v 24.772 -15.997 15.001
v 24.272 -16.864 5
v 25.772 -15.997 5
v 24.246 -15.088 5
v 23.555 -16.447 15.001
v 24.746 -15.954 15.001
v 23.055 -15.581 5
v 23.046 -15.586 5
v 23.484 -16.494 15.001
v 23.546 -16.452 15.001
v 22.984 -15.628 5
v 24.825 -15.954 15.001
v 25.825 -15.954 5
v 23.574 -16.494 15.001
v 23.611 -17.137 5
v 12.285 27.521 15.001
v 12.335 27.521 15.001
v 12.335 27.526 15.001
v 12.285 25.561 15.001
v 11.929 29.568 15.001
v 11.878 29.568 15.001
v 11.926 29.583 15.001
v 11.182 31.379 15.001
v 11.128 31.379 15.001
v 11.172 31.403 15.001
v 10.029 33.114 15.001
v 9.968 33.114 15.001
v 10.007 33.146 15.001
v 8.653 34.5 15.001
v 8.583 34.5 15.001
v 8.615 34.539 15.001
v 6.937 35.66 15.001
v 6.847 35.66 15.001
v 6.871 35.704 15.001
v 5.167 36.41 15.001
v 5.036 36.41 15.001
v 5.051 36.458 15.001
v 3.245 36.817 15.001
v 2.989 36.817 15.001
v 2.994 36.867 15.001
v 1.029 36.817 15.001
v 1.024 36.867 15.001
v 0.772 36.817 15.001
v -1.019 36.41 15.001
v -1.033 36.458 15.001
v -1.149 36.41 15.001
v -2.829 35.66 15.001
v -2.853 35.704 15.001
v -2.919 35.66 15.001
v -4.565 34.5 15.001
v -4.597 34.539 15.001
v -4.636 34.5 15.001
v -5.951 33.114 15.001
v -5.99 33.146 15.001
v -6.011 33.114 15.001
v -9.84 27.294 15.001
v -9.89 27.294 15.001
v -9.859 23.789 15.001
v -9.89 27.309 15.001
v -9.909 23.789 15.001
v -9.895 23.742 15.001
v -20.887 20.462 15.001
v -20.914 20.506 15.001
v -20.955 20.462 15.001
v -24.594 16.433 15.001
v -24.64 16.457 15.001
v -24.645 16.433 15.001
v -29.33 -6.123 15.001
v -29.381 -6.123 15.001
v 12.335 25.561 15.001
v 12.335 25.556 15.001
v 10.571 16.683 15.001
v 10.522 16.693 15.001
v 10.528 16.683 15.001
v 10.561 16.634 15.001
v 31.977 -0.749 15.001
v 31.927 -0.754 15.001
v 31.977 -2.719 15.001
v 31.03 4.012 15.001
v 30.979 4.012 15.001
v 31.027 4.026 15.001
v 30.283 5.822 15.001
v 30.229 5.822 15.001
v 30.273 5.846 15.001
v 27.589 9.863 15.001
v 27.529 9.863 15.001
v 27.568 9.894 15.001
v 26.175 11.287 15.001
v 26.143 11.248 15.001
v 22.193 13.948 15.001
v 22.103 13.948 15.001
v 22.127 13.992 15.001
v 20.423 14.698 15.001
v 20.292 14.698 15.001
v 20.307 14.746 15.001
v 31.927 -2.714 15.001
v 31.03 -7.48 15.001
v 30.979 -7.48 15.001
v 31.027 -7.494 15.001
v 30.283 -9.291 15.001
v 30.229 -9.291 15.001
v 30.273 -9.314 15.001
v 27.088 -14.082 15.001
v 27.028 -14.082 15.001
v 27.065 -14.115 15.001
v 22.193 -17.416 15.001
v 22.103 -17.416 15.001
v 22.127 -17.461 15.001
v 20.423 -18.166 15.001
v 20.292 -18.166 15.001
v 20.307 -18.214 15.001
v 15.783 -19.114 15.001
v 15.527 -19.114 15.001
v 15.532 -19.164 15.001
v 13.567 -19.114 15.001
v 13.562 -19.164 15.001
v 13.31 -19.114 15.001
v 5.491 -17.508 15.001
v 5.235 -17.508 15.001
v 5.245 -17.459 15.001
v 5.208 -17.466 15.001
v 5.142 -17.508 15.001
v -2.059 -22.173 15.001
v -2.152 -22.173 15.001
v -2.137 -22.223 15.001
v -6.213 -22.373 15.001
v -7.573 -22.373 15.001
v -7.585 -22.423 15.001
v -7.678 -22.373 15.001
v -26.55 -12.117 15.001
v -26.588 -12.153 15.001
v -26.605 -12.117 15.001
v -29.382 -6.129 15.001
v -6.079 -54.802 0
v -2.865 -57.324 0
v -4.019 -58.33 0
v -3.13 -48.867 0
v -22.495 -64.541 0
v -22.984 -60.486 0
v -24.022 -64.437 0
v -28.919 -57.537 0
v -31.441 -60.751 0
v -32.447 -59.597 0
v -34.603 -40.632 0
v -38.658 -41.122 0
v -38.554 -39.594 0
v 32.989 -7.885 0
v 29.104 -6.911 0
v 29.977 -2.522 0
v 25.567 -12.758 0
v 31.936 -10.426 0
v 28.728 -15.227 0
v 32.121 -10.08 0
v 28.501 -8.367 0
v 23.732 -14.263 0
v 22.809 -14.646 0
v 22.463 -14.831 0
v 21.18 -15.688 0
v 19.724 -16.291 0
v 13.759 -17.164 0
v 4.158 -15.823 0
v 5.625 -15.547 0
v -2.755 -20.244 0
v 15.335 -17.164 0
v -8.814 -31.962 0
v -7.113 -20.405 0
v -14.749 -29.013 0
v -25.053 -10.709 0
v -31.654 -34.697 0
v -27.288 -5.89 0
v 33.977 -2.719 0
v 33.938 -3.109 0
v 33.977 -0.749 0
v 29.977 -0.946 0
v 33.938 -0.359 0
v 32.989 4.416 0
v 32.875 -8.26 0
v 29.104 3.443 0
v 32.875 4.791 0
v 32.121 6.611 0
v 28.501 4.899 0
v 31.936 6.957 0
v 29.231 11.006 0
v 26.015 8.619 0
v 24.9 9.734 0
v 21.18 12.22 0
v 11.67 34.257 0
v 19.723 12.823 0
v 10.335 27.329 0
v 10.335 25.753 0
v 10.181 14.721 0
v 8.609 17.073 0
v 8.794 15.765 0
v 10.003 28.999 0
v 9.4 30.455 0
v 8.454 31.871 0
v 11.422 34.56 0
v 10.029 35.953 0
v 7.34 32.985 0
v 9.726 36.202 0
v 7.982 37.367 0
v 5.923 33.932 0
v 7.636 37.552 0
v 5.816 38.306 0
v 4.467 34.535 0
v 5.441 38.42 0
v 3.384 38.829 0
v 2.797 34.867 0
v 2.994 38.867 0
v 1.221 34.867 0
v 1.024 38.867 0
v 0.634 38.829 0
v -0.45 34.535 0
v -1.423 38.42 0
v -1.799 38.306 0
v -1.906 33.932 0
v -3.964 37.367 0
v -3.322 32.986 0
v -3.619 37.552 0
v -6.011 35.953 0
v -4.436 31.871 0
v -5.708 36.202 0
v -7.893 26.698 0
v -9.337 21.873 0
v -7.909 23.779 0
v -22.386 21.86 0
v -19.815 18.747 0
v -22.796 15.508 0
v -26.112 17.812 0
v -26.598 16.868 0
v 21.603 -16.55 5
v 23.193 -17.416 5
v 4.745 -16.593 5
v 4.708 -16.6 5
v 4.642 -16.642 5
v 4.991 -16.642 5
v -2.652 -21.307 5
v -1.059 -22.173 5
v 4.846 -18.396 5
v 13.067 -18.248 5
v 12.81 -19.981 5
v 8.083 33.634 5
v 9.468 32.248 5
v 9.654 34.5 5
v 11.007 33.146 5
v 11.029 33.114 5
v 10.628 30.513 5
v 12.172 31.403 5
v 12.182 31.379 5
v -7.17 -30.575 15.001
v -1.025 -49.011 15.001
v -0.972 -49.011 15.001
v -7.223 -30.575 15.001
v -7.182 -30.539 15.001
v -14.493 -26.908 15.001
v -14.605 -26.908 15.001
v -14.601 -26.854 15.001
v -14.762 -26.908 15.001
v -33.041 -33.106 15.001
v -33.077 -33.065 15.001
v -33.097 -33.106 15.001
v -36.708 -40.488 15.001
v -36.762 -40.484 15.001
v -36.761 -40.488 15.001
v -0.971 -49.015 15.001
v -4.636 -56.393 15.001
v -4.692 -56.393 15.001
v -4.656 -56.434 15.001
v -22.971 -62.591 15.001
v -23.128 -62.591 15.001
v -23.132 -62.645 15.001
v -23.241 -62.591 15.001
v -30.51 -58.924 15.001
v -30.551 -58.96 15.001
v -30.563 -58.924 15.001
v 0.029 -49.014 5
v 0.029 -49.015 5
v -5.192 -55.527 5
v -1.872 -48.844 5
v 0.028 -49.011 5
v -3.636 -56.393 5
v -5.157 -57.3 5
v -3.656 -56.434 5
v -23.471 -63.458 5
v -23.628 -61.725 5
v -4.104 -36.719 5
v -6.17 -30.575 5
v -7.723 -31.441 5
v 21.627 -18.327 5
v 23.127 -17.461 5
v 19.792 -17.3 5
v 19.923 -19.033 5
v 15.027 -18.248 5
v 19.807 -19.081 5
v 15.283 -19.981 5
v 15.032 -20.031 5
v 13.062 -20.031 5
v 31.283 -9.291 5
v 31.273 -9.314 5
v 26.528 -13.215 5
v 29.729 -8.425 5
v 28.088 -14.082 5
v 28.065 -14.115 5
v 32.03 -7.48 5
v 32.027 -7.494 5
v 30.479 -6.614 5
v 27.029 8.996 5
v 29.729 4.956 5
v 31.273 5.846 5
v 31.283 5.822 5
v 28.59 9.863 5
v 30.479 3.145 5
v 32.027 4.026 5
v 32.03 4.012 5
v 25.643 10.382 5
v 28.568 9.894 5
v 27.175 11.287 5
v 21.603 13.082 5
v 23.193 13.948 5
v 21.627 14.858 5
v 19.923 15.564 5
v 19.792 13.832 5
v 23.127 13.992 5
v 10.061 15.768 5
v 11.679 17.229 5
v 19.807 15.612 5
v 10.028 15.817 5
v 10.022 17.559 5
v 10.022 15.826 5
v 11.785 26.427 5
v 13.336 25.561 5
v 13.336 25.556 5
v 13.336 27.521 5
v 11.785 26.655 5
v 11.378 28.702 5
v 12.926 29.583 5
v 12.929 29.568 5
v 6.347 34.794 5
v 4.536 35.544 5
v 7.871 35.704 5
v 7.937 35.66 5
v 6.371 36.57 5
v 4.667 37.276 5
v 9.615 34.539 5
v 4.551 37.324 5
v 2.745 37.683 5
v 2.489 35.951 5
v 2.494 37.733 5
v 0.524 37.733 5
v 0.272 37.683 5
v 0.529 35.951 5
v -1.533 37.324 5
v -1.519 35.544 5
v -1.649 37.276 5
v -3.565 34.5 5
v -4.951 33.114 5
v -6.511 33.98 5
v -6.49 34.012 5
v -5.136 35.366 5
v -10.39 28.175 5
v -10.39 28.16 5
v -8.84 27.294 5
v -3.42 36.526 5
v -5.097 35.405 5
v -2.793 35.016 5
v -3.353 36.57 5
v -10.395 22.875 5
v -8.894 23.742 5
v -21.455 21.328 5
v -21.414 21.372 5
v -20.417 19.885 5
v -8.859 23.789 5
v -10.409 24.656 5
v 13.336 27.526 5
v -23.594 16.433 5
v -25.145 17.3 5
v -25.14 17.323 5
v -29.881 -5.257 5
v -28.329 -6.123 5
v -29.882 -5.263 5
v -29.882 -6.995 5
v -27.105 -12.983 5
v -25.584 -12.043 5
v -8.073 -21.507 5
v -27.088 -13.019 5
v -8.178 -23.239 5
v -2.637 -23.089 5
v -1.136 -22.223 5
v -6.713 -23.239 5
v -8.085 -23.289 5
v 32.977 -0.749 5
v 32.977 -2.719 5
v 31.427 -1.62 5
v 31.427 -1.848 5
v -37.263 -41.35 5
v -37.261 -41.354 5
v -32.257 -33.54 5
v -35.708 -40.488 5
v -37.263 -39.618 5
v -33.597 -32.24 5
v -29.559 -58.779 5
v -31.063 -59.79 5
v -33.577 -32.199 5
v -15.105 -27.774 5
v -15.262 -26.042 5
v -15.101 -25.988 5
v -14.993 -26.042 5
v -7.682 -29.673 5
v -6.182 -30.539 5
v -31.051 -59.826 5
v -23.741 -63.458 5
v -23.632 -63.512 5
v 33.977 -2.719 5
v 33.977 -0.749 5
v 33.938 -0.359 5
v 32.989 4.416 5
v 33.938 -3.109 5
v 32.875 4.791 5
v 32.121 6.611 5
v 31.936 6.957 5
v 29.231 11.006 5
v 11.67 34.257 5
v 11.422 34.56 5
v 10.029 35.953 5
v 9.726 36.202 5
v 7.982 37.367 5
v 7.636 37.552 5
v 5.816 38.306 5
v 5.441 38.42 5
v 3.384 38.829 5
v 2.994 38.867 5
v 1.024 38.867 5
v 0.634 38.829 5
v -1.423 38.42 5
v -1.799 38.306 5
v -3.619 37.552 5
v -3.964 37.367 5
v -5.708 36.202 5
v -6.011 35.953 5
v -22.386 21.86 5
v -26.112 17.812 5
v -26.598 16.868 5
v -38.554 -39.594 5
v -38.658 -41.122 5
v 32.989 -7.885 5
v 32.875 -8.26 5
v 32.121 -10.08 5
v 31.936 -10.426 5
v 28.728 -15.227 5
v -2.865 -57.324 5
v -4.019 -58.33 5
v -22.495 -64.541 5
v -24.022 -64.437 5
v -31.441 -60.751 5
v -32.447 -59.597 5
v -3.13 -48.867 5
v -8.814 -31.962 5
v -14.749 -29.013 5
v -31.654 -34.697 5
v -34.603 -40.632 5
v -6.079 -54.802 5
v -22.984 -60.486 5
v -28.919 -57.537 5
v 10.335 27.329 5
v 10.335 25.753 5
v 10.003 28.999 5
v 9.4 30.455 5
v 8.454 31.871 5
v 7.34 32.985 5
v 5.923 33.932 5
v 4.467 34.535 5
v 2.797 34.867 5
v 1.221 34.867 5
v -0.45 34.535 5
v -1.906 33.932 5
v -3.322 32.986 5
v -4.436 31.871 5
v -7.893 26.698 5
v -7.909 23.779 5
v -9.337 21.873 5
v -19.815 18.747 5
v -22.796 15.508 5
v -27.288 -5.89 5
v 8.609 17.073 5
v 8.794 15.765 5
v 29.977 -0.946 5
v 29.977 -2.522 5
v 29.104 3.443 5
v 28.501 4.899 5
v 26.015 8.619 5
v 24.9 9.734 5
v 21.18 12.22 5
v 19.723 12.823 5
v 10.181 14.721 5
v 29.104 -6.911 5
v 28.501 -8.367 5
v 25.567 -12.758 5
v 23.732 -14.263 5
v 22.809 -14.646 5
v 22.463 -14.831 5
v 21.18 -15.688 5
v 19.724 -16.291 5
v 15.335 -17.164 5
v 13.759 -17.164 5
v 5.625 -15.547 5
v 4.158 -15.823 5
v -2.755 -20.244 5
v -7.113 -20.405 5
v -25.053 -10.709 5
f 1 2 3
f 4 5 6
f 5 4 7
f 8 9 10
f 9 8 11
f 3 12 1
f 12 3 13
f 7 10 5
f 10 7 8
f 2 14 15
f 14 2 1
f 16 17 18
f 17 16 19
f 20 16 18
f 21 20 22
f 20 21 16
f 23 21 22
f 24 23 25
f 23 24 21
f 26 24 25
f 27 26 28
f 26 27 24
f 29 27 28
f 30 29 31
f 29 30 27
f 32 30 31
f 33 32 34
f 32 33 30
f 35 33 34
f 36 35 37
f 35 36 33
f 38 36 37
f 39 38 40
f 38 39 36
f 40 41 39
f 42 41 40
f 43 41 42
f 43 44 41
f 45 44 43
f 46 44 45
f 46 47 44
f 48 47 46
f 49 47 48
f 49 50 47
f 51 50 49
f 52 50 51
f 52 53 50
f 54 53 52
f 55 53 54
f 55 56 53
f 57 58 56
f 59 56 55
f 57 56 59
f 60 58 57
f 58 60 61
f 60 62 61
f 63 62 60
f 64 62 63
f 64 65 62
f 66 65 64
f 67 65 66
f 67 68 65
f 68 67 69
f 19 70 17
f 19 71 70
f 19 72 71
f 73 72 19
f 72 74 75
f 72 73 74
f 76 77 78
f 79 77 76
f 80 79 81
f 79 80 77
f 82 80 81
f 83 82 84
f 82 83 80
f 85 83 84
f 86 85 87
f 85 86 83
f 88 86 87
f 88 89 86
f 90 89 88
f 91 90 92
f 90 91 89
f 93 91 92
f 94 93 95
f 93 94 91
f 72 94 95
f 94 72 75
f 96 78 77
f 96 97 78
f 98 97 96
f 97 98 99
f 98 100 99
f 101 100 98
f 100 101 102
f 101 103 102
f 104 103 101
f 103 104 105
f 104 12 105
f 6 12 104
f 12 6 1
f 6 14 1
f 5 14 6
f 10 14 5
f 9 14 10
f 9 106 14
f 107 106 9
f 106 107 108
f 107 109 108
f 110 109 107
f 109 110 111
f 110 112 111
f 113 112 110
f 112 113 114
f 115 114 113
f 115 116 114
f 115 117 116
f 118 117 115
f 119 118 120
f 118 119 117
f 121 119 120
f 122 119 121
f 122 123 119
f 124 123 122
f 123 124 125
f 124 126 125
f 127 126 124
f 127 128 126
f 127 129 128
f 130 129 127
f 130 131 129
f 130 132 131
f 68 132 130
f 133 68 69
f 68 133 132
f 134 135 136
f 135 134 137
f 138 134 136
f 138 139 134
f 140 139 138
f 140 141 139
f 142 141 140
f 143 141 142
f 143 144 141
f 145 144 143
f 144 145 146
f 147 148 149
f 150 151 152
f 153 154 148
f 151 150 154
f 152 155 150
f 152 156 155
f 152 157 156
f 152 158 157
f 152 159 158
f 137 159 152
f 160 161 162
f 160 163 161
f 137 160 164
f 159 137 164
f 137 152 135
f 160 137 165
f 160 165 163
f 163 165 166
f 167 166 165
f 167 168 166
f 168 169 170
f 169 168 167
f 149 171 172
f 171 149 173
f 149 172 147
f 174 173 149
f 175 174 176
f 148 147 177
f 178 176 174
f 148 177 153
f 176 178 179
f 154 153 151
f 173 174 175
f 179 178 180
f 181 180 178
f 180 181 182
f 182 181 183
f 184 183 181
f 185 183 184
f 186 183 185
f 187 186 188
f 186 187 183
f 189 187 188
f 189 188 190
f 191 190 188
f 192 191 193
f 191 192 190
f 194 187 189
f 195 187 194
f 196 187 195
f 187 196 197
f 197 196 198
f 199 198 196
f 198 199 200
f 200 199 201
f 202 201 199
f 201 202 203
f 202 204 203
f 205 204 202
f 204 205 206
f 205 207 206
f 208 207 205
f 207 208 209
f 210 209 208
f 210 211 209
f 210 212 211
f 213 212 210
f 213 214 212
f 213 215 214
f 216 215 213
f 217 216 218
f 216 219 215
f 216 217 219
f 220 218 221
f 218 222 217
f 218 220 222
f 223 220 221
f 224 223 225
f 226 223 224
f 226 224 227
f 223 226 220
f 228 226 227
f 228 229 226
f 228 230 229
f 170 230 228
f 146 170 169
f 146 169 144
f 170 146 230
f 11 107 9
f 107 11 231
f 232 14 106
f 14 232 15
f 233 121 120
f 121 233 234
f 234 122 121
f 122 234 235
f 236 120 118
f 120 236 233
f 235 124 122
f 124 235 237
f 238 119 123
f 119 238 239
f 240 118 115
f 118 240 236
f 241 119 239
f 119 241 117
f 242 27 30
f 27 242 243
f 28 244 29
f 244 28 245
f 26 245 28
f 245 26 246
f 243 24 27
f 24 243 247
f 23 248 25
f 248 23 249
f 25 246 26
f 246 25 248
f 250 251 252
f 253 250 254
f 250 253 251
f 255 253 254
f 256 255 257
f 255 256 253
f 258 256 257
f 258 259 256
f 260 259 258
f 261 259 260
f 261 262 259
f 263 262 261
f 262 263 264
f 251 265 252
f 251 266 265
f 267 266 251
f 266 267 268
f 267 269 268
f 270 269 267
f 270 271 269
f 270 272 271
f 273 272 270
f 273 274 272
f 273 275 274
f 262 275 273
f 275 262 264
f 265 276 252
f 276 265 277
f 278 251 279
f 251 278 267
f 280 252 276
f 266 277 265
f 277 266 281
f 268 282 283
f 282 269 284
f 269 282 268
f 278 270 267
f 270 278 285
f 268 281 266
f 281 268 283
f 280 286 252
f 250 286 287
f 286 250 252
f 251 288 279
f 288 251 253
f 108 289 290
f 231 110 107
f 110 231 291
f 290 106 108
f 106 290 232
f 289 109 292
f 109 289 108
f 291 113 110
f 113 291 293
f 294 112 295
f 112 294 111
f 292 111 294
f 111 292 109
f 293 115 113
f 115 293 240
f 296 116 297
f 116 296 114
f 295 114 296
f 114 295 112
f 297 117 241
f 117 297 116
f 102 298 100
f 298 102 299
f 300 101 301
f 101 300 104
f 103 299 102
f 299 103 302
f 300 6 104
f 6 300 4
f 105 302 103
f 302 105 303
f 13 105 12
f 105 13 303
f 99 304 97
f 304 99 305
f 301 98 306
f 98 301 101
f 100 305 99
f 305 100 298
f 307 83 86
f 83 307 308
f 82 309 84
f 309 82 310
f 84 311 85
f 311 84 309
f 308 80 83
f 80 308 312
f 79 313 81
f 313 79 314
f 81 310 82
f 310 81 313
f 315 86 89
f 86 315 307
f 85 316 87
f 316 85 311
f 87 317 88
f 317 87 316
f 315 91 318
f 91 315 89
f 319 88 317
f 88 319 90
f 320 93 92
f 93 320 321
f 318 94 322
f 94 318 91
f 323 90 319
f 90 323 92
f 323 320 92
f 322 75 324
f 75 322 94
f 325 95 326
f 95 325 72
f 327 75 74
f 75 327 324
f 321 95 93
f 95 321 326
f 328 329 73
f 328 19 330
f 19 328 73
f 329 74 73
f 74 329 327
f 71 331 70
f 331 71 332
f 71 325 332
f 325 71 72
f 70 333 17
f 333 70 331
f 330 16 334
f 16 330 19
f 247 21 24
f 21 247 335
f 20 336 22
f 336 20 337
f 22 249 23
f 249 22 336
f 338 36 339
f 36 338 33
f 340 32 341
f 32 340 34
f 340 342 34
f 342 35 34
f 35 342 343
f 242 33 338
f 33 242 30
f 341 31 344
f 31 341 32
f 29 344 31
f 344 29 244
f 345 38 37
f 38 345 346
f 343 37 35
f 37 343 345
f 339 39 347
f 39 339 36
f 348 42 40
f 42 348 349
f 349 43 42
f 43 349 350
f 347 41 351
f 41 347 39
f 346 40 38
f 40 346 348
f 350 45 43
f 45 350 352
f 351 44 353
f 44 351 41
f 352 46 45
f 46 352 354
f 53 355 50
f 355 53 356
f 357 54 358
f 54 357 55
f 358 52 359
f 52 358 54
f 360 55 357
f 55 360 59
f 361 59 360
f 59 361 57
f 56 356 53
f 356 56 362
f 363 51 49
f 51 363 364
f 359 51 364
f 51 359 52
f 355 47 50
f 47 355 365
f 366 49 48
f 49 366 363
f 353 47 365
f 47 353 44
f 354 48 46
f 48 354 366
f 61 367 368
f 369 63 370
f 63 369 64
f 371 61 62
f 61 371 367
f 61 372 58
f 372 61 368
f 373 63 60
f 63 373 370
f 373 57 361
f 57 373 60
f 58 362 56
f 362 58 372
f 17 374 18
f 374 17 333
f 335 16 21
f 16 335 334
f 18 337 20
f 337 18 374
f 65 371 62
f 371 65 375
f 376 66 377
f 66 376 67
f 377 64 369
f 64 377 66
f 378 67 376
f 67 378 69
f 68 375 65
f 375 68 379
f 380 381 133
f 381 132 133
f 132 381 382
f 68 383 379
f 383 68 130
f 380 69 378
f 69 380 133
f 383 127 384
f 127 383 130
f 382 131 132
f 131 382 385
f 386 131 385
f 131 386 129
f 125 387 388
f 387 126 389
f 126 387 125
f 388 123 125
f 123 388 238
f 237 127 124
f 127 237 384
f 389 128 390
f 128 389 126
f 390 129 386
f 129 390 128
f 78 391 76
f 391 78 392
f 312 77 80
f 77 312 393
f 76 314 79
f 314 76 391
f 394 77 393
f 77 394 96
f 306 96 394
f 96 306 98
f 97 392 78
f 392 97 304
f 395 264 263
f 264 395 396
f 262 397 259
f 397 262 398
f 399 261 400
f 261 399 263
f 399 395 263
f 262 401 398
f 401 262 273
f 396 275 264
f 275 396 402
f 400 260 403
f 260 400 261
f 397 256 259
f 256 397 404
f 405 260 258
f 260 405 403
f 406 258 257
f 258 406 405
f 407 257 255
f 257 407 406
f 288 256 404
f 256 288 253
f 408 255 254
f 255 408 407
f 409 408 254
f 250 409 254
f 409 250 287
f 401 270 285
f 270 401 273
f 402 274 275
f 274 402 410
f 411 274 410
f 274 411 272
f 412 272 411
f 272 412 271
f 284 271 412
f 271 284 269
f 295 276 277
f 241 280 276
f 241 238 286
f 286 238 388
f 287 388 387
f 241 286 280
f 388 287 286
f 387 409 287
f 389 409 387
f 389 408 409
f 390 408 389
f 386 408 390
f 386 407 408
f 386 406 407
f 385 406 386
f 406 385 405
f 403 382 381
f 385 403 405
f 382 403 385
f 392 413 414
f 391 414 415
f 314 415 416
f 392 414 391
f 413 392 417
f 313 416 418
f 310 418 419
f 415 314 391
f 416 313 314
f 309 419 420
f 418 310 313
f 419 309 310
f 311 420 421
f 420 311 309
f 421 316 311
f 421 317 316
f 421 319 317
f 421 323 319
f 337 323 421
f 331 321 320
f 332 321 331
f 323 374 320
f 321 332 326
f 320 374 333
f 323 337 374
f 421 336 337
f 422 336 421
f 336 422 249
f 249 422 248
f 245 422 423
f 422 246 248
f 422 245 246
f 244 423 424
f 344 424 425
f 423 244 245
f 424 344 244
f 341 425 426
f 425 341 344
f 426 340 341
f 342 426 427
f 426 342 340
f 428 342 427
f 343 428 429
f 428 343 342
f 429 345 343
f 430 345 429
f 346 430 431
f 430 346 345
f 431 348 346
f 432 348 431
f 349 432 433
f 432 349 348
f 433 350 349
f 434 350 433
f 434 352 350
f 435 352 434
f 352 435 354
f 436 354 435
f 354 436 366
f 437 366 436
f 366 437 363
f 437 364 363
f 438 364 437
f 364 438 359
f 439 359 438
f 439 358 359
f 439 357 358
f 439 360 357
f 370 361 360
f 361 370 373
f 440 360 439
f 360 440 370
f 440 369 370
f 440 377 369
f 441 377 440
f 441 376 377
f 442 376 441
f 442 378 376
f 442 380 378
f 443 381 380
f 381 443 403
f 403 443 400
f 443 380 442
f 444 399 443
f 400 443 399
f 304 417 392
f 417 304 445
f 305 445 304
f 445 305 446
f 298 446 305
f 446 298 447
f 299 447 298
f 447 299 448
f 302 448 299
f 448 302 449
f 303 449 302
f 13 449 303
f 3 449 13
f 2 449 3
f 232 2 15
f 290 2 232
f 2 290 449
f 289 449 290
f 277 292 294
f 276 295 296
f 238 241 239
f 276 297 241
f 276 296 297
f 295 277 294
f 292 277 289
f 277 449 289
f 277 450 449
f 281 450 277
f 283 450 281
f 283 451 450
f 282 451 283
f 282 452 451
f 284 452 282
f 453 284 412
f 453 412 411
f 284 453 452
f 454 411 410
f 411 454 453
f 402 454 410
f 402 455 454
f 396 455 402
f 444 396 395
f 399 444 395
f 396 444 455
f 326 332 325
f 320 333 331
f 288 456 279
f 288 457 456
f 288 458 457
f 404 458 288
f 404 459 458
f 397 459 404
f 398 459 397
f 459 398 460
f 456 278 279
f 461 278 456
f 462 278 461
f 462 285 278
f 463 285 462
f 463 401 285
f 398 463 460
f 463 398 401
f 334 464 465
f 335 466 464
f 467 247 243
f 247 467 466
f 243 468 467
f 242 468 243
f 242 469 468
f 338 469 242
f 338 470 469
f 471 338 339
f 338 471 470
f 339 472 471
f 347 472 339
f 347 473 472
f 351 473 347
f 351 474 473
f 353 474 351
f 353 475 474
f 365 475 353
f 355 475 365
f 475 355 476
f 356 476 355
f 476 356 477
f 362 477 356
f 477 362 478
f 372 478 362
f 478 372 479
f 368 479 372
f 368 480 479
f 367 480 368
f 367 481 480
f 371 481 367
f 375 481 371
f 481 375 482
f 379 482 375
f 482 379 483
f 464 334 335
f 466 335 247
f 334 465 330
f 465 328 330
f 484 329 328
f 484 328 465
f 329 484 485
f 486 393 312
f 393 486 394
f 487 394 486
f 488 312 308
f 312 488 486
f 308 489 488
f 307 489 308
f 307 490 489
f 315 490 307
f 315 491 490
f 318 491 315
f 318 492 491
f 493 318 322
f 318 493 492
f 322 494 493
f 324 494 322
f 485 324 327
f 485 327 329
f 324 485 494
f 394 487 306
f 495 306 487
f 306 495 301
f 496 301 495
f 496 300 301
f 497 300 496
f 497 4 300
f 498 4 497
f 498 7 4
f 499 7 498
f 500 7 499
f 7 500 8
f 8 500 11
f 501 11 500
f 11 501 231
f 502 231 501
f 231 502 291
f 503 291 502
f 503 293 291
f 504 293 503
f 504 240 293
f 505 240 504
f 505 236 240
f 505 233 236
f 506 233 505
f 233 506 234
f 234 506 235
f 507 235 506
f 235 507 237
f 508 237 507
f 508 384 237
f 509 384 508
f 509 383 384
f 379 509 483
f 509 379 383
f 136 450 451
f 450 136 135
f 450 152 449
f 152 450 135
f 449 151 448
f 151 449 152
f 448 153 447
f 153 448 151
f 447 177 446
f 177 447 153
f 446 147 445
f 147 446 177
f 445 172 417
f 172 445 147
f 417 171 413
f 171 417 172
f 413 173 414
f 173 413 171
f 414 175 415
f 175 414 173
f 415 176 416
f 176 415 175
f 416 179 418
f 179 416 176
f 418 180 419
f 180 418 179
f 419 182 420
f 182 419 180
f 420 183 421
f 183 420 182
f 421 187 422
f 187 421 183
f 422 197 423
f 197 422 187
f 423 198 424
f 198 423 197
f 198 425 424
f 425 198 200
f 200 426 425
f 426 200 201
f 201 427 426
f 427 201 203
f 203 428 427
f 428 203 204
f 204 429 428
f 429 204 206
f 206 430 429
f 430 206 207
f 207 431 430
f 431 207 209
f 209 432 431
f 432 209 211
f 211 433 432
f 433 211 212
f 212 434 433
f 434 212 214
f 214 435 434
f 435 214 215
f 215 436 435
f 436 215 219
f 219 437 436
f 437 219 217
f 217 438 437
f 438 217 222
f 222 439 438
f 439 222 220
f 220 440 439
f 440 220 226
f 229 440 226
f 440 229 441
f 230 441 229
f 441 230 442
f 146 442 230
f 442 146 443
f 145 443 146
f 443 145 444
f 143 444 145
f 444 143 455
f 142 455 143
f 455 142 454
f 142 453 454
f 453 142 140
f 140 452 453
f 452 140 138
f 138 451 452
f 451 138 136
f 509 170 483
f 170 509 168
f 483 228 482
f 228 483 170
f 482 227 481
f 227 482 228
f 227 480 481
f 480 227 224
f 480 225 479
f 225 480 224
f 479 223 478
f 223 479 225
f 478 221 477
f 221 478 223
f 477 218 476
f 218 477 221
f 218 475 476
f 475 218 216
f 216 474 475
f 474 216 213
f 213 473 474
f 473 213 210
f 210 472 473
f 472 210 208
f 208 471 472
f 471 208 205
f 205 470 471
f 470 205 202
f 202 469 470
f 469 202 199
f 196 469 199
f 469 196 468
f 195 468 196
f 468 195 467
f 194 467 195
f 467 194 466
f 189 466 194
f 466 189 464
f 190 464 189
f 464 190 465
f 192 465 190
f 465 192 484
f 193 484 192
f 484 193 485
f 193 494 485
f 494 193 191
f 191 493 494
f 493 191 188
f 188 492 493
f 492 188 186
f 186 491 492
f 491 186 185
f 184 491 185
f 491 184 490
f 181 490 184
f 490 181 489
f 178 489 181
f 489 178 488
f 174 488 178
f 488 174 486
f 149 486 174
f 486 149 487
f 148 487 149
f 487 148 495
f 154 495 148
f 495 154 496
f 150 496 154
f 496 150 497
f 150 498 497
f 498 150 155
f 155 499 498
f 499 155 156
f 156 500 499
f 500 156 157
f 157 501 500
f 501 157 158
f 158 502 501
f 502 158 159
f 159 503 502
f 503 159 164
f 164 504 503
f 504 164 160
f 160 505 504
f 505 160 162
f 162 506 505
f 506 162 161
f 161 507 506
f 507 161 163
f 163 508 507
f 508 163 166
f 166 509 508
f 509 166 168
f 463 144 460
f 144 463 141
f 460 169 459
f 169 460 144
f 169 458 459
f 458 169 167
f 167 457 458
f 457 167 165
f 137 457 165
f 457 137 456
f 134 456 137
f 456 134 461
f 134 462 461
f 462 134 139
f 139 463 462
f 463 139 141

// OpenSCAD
    // sharp cookiecutter, prompted by online question
    cutterheight = 15;
    connecting_brim = true; // hold together multipart cutter
    brim_height = 5;
    brim_width = 4;
    // demo code
    sharpcookie() random_shape(seed = 1141111);
    // or
    //sharpcookie () scale(2.5) import("easypeasy.svg");
    // end demo code
    //
    // generates cookiecutter from any 2d shape
    module sharpcookie() {
        if (connecting_brim) {
            connecting_brim() children();
        }
        minkowski() {
            linear_extrude(0.001) difference() {
                children();
                offset(-.05) children();
            }
            union() {
                $fn = 3;
                if (!connecting_brim) cylinder(brim_height, brim_width / 2, brim_width / 2);
                cylinder(cutterheight, 1.5, 0);
            }
        }
    }
    //
    // extended brim to hold cutter parts together
    module connecting_brim() {
        linear_extrude(brim_height) difference() {
            hull() offset(brim_width / 2) children();
            offset(-brim_width / 2) children();
        }
    }
    //
    // random shape generator for demo
    module random_shape(seed = 10) {
        offset(chamfer = true, delta = 10, $fn = 0) offset(delta = -20, $fn = 2) offset(10, $fn = 2)
        scale(.5)
        for (i = [0.1: 3]) {
            $fn = 16;
            translate(rands(-30, 60, 2, seed + i))
            circle(10 + rands(0, 40, 1)[0]);
            translate(rands(-50, 20, 2))
            rotate(rands(0, 12, 1)[0] * 30)
            square(20 + rands(0, 50, 1)[0]);
            translate(rands(-40, 40, 2))
            rotate(rands(0, 12, 1)[0] * 30)
            square(20 + rands(0, 50, 1)[0], true);
        }
    }
